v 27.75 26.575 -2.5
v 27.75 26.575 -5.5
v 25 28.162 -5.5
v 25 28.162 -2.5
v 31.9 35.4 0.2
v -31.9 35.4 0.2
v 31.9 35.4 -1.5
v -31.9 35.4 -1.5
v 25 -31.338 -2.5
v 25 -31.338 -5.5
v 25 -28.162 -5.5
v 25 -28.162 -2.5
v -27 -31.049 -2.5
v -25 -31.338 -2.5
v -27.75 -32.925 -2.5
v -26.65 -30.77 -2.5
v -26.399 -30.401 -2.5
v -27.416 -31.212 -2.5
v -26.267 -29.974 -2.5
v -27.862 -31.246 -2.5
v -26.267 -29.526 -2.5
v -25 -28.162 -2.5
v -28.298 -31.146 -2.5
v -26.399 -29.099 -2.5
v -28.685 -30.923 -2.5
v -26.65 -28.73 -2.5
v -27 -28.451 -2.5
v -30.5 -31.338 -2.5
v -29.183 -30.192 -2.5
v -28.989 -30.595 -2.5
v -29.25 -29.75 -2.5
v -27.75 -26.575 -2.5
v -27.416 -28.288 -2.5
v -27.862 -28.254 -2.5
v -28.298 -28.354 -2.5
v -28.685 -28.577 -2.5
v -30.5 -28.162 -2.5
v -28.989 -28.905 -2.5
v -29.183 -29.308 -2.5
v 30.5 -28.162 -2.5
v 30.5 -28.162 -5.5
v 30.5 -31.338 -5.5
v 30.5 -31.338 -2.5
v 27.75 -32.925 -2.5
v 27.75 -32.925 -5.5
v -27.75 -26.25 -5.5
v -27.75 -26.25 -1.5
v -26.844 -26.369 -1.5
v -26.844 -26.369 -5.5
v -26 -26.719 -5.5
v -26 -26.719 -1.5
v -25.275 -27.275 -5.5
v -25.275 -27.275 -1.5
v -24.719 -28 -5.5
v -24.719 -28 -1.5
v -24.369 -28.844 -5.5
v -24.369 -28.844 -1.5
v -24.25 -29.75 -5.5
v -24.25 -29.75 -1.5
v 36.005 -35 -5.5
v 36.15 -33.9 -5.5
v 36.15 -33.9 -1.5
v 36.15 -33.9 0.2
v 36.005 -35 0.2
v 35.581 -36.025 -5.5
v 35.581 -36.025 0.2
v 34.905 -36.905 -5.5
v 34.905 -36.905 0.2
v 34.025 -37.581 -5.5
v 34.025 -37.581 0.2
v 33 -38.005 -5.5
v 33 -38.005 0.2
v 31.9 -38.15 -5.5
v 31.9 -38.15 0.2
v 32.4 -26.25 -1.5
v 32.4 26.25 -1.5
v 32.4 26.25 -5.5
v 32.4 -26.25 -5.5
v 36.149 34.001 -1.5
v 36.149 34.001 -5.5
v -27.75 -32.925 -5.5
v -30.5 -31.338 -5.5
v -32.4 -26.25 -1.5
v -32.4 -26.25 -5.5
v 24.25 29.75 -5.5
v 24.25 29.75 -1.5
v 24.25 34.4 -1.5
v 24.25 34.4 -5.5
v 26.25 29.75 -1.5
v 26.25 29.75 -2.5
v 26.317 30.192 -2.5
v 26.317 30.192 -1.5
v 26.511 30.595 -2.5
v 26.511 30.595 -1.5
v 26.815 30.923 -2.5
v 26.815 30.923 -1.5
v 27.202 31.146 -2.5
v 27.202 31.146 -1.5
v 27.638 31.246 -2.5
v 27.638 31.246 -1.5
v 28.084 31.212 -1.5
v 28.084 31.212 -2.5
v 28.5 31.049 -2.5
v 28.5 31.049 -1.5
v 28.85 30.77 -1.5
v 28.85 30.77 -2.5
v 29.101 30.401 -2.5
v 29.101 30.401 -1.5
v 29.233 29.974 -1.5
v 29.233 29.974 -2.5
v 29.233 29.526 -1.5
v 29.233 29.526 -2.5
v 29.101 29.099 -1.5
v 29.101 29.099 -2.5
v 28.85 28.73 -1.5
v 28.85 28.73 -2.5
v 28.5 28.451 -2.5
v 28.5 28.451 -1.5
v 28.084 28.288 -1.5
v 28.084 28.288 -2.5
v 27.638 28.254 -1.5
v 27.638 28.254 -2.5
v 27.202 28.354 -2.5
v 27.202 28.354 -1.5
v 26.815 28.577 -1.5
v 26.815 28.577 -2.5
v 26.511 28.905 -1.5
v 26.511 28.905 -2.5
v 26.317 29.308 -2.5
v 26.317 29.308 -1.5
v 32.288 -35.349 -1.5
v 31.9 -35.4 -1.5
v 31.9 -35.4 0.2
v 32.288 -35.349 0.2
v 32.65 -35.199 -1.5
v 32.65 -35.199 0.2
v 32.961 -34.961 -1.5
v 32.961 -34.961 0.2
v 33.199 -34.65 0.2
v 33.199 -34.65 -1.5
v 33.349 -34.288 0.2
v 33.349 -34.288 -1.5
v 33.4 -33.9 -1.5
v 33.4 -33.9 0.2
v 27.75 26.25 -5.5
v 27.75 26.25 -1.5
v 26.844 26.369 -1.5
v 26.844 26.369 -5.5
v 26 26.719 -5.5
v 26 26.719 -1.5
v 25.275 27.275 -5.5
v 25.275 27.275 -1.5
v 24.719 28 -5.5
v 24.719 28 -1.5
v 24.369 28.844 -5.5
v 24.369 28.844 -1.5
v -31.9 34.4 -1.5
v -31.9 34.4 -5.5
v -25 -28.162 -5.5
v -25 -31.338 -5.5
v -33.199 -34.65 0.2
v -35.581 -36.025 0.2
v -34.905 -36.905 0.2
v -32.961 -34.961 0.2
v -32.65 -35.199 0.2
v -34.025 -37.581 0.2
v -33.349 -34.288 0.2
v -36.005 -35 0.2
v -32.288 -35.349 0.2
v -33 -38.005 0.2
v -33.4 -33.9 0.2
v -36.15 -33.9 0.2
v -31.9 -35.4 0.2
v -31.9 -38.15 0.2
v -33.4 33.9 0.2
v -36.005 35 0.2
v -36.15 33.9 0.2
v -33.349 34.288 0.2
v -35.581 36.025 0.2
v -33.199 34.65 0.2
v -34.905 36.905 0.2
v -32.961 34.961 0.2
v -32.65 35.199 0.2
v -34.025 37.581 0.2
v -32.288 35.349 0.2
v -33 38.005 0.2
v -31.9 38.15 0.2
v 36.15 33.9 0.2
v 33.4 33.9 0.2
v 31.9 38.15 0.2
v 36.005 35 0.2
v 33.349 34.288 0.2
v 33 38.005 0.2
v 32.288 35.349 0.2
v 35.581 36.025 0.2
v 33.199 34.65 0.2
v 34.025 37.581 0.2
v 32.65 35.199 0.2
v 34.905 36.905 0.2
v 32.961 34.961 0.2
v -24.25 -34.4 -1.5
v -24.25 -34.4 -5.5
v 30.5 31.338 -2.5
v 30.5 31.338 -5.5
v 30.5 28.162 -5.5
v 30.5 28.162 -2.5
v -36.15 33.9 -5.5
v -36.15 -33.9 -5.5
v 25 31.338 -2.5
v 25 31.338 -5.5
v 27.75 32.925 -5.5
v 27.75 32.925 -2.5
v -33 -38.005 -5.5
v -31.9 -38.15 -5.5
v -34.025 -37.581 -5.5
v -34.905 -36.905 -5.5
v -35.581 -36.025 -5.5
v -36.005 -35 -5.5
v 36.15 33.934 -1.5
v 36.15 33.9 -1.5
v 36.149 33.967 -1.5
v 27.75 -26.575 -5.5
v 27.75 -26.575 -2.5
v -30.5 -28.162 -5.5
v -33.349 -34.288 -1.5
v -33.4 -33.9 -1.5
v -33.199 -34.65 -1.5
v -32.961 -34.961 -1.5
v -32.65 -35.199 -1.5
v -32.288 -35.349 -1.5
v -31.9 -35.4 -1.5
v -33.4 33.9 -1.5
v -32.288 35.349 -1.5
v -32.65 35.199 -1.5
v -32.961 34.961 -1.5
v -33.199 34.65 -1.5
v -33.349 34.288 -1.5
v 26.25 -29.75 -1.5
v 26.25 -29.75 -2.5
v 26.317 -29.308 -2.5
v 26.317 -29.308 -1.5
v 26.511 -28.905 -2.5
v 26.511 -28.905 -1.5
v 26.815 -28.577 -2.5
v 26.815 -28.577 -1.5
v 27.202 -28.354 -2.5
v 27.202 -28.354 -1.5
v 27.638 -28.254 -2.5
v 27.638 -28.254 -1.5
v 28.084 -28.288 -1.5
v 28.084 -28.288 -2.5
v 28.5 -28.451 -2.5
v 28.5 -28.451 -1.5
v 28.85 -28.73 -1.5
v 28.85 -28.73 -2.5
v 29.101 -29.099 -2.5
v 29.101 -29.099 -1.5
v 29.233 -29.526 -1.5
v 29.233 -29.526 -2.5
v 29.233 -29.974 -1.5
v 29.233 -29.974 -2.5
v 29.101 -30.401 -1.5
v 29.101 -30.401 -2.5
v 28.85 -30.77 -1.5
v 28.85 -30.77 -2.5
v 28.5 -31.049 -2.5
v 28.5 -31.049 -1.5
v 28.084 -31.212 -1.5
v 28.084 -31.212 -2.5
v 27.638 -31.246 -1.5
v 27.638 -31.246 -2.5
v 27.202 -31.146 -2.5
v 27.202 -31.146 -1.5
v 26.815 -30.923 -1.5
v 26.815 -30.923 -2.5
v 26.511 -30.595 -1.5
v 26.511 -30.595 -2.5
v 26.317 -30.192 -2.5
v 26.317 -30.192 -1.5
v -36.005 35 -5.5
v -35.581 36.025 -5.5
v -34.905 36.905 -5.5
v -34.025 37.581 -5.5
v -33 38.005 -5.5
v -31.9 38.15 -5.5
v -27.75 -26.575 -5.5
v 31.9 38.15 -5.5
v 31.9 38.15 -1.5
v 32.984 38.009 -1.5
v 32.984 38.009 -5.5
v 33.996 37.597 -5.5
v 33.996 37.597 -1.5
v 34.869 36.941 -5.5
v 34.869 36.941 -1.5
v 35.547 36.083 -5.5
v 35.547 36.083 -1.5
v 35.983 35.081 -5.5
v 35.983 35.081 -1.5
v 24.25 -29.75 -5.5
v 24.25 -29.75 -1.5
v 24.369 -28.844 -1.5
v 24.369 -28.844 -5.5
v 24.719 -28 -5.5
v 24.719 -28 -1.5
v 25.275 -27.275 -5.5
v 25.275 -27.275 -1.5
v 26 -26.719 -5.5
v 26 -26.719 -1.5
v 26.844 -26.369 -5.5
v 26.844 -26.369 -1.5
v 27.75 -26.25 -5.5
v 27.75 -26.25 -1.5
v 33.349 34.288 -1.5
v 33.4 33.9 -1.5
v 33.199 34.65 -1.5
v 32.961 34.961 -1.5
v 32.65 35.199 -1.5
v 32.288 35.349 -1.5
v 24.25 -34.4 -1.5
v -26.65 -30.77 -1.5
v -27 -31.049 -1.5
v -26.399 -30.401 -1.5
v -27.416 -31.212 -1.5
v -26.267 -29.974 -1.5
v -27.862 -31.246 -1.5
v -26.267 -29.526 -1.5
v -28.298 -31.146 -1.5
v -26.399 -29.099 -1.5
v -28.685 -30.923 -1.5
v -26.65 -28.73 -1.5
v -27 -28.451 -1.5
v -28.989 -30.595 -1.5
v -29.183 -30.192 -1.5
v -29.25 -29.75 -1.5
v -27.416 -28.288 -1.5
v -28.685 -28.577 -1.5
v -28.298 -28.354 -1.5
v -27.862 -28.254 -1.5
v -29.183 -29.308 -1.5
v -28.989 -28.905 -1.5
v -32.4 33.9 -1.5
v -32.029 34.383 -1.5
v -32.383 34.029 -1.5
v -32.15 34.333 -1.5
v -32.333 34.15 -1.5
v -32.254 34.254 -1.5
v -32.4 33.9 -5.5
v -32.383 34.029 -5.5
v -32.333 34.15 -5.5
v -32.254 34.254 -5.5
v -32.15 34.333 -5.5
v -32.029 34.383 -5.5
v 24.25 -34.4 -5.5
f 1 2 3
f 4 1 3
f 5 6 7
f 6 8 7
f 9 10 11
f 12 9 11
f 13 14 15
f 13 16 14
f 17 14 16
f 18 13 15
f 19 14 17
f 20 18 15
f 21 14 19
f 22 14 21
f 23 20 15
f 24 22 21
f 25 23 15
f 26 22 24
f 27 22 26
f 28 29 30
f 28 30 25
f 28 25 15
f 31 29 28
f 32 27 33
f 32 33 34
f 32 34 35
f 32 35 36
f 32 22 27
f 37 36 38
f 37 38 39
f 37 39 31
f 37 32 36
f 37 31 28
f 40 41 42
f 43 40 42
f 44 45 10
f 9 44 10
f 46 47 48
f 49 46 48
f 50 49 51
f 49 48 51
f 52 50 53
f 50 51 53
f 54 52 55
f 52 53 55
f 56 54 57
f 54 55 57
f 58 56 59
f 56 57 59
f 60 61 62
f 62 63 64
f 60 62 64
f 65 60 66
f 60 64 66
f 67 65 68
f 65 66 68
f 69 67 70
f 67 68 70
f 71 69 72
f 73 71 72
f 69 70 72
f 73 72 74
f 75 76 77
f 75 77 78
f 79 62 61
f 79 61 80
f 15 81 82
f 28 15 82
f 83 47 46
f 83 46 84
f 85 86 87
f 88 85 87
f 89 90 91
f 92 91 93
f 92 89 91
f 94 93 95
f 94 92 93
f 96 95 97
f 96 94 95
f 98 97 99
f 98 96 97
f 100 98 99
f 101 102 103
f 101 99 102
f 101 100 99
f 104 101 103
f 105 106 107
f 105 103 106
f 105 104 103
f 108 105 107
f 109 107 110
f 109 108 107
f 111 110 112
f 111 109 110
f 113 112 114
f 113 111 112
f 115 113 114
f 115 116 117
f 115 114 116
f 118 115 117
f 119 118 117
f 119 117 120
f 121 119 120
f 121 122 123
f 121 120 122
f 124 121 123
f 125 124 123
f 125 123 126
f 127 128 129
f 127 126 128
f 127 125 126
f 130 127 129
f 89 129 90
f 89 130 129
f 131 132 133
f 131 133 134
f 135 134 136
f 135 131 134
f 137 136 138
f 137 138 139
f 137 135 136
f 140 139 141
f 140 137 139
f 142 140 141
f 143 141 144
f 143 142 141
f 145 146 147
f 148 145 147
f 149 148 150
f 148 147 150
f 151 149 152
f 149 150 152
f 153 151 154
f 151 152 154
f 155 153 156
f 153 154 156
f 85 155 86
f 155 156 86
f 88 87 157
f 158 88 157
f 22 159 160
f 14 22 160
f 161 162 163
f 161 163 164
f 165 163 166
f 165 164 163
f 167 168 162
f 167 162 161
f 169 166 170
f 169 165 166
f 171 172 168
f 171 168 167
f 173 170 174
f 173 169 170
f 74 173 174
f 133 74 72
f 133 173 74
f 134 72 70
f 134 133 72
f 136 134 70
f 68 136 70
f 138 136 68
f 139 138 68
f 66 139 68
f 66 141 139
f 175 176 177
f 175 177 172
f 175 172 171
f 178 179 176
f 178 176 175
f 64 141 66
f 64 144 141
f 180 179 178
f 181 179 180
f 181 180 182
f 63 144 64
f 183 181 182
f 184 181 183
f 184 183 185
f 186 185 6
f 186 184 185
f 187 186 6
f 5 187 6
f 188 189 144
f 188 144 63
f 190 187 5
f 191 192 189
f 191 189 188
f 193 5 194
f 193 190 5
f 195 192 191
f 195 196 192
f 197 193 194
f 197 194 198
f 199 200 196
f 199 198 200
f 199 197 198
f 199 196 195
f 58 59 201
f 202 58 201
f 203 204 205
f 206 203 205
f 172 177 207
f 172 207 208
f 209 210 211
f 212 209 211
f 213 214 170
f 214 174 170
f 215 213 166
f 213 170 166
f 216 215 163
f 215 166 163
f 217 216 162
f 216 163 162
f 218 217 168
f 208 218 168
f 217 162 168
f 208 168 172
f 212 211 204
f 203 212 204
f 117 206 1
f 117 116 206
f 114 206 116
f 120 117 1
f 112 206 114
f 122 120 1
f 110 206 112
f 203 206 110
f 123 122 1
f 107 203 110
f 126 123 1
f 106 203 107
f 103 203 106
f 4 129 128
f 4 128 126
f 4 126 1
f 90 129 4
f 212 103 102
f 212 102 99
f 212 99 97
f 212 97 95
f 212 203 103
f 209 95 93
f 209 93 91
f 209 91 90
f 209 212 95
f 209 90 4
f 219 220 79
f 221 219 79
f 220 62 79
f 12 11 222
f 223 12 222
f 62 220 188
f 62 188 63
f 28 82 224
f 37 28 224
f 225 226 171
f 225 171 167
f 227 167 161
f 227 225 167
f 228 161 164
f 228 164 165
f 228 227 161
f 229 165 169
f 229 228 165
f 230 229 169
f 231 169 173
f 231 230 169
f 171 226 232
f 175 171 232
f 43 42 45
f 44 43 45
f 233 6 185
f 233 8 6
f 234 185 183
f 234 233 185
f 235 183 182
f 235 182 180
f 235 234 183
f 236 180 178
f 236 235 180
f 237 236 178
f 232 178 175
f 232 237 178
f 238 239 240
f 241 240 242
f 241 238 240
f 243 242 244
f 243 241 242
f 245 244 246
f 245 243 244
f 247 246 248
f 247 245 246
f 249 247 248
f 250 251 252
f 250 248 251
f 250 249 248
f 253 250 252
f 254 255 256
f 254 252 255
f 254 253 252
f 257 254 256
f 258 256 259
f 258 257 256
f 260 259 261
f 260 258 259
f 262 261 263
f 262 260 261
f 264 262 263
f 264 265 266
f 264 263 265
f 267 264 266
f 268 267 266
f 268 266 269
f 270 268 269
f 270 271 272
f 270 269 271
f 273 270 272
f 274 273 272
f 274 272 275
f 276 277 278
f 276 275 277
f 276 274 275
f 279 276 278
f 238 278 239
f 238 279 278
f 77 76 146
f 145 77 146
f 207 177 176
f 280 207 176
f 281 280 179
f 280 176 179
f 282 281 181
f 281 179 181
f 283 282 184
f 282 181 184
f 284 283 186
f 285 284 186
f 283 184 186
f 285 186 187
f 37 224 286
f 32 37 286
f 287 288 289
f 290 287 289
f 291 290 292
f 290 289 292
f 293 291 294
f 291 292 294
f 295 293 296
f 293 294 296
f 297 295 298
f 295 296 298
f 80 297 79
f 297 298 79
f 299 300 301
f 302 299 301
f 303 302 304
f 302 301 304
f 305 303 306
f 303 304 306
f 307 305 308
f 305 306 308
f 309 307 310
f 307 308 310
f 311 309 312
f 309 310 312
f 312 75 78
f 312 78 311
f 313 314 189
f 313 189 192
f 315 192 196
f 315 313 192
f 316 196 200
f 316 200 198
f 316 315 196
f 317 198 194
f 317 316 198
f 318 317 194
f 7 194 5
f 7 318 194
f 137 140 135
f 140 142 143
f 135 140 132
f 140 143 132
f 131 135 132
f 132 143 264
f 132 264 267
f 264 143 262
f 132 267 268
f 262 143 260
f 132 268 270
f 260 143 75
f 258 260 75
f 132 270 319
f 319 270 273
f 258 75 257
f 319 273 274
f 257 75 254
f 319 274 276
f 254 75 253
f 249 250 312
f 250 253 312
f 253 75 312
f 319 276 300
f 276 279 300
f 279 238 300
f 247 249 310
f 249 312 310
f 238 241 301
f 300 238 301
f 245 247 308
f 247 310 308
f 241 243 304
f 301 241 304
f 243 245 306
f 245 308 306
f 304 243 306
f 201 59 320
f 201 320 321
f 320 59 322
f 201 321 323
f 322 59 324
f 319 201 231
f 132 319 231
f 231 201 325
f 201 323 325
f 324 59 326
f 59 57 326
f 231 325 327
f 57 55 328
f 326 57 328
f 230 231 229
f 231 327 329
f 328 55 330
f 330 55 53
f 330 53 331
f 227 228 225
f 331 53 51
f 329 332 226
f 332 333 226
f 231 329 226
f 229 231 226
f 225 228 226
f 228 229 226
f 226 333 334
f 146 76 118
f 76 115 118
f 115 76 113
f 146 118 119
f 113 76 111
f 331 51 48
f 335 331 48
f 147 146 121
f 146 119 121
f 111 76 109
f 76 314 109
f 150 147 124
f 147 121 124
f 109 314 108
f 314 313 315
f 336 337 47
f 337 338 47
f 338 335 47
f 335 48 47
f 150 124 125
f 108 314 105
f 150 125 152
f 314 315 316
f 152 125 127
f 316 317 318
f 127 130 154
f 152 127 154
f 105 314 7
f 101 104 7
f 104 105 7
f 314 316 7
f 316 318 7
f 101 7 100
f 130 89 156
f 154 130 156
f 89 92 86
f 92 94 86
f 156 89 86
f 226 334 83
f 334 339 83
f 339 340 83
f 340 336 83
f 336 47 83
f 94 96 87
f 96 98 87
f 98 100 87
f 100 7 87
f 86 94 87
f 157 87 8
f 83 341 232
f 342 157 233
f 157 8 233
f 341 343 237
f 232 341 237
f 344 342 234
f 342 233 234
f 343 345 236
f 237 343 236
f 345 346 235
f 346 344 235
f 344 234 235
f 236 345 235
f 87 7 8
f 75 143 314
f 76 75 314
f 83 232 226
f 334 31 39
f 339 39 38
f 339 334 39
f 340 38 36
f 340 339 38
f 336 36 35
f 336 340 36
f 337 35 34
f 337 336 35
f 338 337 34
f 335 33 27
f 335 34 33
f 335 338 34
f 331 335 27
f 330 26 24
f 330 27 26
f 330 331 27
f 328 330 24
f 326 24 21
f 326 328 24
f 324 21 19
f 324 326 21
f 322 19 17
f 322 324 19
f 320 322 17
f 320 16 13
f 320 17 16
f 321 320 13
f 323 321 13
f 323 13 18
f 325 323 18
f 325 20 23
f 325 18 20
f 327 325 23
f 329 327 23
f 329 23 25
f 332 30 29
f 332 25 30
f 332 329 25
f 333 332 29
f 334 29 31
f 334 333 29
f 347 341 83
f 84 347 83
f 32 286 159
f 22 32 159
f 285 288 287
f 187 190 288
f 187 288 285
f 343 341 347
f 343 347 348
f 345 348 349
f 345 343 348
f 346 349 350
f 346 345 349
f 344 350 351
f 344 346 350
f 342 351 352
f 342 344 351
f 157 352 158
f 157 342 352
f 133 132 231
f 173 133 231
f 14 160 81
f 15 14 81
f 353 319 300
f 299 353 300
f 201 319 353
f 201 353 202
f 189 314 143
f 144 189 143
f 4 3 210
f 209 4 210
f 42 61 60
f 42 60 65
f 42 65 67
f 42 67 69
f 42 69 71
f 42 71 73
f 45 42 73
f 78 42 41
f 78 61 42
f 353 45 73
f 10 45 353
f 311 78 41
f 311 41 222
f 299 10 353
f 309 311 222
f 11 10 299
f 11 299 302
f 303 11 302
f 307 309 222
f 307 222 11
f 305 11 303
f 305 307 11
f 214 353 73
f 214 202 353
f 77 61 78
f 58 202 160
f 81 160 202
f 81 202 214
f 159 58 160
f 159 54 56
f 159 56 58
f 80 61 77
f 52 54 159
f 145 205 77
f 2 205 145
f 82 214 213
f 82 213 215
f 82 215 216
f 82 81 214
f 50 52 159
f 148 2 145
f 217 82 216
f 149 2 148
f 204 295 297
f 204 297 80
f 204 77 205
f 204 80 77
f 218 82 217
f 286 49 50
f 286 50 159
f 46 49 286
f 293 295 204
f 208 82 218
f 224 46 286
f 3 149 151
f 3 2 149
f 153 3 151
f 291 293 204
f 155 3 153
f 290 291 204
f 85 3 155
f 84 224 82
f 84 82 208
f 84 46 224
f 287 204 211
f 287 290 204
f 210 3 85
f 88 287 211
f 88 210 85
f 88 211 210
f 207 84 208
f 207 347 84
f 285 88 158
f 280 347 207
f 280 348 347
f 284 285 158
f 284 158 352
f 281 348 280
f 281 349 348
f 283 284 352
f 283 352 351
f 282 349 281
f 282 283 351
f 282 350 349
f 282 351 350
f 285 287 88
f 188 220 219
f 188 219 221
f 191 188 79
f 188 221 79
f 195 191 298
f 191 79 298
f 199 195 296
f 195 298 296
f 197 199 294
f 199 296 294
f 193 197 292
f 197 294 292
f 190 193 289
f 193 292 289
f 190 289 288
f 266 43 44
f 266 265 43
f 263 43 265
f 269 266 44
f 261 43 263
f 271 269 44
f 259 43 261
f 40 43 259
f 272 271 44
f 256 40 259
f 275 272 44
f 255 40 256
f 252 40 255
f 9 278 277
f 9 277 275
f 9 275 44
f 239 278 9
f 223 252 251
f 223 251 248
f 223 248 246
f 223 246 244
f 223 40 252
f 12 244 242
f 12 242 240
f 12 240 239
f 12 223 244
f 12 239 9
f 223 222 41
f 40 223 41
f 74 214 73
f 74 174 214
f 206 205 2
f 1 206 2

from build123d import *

# Parameters (mm, degrees)
PAD007_DEPTH      = 1.5
PAD007_DEPTH_BACK = 0.2
SKETCH008_R       = 1.5
PAD008_DEPTH      = 4
POCKET006_DEPTH   = 3


with BuildPart() as part:
    # Sketch007 → Pad007 (new body, two sides)
    with BuildSketch(Plane.XY) as pad007_sk:
        with BuildLine():
            ThreePointArc((-31.9, 38.15), (-34.905204, 36.905204), (-36.15, 33.9))
            Line((-36.15, -33.9), (-36.15, 33.9))
            ThreePointArc((-36.15, -33.9), (-34.905204, -36.905204), (-31.9, -38.15))
            Line((31.9, -38.15), (-31.9, -38.15))
            ThreePointArc((31.9, -38.15), (34.905204, -36.905204), (36.15, -33.9))
            Line((36.15, 33.9), (36.15, -33.9))
            ThreePointArc((36.15, 33.9), (34.905204, 36.905204), (31.9, 38.15))
            Line((-31.9, 38.15), (31.9, 38.15))
        make_face()
        with BuildLine():
            ThreePointArc((-31.9, 35.4), (-32.96066, 34.96066), (-33.4, 33.9))
            Line((-33.4, -33.9), (-33.4, 33.9))
            ThreePointArc((-33.4, -33.9), (-32.96066, -34.96066), (-31.9, -35.4))
            Line((31.9, -35.4), (-31.9, -35.4))
            ThreePointArc((31.9, -35.4), (32.96066, -34.96066), (33.4, -33.9))
            Line((33.4, 33.9), (33.4, -33.9))
            ThreePointArc((33.4, 33.9), (32.96066, 34.96066), (31.9, 35.4))
            Line((-31.9, 35.4), (31.9, 35.4))
        make_face(mode=Mode.SUBTRACT)
    extrude(amount=-PAD007_DEPTH)
    extrude(pad007_sk.sketch, amount=PAD007_DEPTH_BACK)

    # Sketch008 → Pad008 (join)
    with BuildSketch(Plane(origin=(0, 0, -1.5), x_dir=(-1, 0, 0), z_dir=(0, 0, -1))):
        with BuildLine():
            ThreePointArc((-31.9, 38.15), (-34.869436, 36.94055), (-36.14881, 34.000563))
            Line((-36.15, -33.9), (-36.14881, 34.000563))
            ThreePointArc((-36.15, -33.9), (-34.905204, -36.905204), (-31.9, -38.15))
            Line((31.9, -38.15), (-31.9, -38.15))
            ThreePointArc((31.9, -38.15), (34.905204, -36.905204), (36.15, -33.9))
            Line((36.15, 33.9), (36.15, -33.9))
            ThreePointArc((36.15, 33.9), (34.905204, 36.905204), (31.9, 38.15))
            Line((-31.9, 38.15), (31.9, 38.15))
        make_face()
        with Locations((-27.75, 29.75)):
            Circle(SKETCH008_R, mode=Mode.SUBTRACT)
        with Locations((-27.75, -29.75)):
            Circle(SKETCH008_R, mode=Mode.SUBTRACT)
        with Locations((27.75, -29.75)):
            Circle(SKETCH008_R, mode=Mode.SUBTRACT)
        with BuildLine():
            ThreePointArc((-27.75, 26.25), (-25.275126, 27.275126), (-24.25, 29.75))
            Line((-24.25, 29.75), (-24.25, 34.4))
            Line((-24.25, 34.4), (31.9, 34.4))
            ThreePointArc((32.4, 33.9), (32.253553, 34.253553), (31.9, 34.4))
            Line((32.4, 33.9), (32.4, -26.25))
            Line((27.75, -26.25), (32.4, -26.25))
            ThreePointArc((27.75, -26.25), (25.275126, -27.275126), (24.25, -29.75))
            Line((24.25, -29.75), (24.25, -34.4))
            Line((-24.25, -34.4), (24.25, -34.4))
            Line((-24.25, -34.4), (-24.25, -29.75))
            ThreePointArc((-24.25, -29.75), (-25.275126, -27.275126), (-27.75, -26.25))
            Line((-32.4, -26.25), (-27.75, -26.25))
            Line((-32.4, 26.25), (-32.4, -26.25))
            Line((-32.4, 26.25), (-27.75, 26.25))
        make_face(mode=Mode.SUBTRACT)
    extrude(amount=PAD008_DEPTH)

    # Sketch021 → Pocket006 (cut)
    with BuildSketch(Plane(origin=(0, 0, -5.5), x_dir=(-1, 0, 0), z_dir=(0, 0, -1))):
        Polygon((-25, 28.162287), (-25, 31.337713), (-27.75, 32.925426), (-30.5, 31.337713), (-30.5, 28.162287), (-27.75, 26.574574), align=None)
        Polygon((-25, -31.337713), (-25, -28.162287), (-27.75, -26.574574), (-30.5, -28.162287), (-30.5, -31.337713), (-27.75, -32.925426), align=None)
        Polygon((30.5, -31.337713), (30.5, -28.162287), (27.75, -26.574574), (25, -28.162287), (25, -31.337713), (27.75, -32.925426), align=None)
    extrude(amount=-POCKET006_DEPTH, mode=Mode.SUBTRACT)


solid = part.part
